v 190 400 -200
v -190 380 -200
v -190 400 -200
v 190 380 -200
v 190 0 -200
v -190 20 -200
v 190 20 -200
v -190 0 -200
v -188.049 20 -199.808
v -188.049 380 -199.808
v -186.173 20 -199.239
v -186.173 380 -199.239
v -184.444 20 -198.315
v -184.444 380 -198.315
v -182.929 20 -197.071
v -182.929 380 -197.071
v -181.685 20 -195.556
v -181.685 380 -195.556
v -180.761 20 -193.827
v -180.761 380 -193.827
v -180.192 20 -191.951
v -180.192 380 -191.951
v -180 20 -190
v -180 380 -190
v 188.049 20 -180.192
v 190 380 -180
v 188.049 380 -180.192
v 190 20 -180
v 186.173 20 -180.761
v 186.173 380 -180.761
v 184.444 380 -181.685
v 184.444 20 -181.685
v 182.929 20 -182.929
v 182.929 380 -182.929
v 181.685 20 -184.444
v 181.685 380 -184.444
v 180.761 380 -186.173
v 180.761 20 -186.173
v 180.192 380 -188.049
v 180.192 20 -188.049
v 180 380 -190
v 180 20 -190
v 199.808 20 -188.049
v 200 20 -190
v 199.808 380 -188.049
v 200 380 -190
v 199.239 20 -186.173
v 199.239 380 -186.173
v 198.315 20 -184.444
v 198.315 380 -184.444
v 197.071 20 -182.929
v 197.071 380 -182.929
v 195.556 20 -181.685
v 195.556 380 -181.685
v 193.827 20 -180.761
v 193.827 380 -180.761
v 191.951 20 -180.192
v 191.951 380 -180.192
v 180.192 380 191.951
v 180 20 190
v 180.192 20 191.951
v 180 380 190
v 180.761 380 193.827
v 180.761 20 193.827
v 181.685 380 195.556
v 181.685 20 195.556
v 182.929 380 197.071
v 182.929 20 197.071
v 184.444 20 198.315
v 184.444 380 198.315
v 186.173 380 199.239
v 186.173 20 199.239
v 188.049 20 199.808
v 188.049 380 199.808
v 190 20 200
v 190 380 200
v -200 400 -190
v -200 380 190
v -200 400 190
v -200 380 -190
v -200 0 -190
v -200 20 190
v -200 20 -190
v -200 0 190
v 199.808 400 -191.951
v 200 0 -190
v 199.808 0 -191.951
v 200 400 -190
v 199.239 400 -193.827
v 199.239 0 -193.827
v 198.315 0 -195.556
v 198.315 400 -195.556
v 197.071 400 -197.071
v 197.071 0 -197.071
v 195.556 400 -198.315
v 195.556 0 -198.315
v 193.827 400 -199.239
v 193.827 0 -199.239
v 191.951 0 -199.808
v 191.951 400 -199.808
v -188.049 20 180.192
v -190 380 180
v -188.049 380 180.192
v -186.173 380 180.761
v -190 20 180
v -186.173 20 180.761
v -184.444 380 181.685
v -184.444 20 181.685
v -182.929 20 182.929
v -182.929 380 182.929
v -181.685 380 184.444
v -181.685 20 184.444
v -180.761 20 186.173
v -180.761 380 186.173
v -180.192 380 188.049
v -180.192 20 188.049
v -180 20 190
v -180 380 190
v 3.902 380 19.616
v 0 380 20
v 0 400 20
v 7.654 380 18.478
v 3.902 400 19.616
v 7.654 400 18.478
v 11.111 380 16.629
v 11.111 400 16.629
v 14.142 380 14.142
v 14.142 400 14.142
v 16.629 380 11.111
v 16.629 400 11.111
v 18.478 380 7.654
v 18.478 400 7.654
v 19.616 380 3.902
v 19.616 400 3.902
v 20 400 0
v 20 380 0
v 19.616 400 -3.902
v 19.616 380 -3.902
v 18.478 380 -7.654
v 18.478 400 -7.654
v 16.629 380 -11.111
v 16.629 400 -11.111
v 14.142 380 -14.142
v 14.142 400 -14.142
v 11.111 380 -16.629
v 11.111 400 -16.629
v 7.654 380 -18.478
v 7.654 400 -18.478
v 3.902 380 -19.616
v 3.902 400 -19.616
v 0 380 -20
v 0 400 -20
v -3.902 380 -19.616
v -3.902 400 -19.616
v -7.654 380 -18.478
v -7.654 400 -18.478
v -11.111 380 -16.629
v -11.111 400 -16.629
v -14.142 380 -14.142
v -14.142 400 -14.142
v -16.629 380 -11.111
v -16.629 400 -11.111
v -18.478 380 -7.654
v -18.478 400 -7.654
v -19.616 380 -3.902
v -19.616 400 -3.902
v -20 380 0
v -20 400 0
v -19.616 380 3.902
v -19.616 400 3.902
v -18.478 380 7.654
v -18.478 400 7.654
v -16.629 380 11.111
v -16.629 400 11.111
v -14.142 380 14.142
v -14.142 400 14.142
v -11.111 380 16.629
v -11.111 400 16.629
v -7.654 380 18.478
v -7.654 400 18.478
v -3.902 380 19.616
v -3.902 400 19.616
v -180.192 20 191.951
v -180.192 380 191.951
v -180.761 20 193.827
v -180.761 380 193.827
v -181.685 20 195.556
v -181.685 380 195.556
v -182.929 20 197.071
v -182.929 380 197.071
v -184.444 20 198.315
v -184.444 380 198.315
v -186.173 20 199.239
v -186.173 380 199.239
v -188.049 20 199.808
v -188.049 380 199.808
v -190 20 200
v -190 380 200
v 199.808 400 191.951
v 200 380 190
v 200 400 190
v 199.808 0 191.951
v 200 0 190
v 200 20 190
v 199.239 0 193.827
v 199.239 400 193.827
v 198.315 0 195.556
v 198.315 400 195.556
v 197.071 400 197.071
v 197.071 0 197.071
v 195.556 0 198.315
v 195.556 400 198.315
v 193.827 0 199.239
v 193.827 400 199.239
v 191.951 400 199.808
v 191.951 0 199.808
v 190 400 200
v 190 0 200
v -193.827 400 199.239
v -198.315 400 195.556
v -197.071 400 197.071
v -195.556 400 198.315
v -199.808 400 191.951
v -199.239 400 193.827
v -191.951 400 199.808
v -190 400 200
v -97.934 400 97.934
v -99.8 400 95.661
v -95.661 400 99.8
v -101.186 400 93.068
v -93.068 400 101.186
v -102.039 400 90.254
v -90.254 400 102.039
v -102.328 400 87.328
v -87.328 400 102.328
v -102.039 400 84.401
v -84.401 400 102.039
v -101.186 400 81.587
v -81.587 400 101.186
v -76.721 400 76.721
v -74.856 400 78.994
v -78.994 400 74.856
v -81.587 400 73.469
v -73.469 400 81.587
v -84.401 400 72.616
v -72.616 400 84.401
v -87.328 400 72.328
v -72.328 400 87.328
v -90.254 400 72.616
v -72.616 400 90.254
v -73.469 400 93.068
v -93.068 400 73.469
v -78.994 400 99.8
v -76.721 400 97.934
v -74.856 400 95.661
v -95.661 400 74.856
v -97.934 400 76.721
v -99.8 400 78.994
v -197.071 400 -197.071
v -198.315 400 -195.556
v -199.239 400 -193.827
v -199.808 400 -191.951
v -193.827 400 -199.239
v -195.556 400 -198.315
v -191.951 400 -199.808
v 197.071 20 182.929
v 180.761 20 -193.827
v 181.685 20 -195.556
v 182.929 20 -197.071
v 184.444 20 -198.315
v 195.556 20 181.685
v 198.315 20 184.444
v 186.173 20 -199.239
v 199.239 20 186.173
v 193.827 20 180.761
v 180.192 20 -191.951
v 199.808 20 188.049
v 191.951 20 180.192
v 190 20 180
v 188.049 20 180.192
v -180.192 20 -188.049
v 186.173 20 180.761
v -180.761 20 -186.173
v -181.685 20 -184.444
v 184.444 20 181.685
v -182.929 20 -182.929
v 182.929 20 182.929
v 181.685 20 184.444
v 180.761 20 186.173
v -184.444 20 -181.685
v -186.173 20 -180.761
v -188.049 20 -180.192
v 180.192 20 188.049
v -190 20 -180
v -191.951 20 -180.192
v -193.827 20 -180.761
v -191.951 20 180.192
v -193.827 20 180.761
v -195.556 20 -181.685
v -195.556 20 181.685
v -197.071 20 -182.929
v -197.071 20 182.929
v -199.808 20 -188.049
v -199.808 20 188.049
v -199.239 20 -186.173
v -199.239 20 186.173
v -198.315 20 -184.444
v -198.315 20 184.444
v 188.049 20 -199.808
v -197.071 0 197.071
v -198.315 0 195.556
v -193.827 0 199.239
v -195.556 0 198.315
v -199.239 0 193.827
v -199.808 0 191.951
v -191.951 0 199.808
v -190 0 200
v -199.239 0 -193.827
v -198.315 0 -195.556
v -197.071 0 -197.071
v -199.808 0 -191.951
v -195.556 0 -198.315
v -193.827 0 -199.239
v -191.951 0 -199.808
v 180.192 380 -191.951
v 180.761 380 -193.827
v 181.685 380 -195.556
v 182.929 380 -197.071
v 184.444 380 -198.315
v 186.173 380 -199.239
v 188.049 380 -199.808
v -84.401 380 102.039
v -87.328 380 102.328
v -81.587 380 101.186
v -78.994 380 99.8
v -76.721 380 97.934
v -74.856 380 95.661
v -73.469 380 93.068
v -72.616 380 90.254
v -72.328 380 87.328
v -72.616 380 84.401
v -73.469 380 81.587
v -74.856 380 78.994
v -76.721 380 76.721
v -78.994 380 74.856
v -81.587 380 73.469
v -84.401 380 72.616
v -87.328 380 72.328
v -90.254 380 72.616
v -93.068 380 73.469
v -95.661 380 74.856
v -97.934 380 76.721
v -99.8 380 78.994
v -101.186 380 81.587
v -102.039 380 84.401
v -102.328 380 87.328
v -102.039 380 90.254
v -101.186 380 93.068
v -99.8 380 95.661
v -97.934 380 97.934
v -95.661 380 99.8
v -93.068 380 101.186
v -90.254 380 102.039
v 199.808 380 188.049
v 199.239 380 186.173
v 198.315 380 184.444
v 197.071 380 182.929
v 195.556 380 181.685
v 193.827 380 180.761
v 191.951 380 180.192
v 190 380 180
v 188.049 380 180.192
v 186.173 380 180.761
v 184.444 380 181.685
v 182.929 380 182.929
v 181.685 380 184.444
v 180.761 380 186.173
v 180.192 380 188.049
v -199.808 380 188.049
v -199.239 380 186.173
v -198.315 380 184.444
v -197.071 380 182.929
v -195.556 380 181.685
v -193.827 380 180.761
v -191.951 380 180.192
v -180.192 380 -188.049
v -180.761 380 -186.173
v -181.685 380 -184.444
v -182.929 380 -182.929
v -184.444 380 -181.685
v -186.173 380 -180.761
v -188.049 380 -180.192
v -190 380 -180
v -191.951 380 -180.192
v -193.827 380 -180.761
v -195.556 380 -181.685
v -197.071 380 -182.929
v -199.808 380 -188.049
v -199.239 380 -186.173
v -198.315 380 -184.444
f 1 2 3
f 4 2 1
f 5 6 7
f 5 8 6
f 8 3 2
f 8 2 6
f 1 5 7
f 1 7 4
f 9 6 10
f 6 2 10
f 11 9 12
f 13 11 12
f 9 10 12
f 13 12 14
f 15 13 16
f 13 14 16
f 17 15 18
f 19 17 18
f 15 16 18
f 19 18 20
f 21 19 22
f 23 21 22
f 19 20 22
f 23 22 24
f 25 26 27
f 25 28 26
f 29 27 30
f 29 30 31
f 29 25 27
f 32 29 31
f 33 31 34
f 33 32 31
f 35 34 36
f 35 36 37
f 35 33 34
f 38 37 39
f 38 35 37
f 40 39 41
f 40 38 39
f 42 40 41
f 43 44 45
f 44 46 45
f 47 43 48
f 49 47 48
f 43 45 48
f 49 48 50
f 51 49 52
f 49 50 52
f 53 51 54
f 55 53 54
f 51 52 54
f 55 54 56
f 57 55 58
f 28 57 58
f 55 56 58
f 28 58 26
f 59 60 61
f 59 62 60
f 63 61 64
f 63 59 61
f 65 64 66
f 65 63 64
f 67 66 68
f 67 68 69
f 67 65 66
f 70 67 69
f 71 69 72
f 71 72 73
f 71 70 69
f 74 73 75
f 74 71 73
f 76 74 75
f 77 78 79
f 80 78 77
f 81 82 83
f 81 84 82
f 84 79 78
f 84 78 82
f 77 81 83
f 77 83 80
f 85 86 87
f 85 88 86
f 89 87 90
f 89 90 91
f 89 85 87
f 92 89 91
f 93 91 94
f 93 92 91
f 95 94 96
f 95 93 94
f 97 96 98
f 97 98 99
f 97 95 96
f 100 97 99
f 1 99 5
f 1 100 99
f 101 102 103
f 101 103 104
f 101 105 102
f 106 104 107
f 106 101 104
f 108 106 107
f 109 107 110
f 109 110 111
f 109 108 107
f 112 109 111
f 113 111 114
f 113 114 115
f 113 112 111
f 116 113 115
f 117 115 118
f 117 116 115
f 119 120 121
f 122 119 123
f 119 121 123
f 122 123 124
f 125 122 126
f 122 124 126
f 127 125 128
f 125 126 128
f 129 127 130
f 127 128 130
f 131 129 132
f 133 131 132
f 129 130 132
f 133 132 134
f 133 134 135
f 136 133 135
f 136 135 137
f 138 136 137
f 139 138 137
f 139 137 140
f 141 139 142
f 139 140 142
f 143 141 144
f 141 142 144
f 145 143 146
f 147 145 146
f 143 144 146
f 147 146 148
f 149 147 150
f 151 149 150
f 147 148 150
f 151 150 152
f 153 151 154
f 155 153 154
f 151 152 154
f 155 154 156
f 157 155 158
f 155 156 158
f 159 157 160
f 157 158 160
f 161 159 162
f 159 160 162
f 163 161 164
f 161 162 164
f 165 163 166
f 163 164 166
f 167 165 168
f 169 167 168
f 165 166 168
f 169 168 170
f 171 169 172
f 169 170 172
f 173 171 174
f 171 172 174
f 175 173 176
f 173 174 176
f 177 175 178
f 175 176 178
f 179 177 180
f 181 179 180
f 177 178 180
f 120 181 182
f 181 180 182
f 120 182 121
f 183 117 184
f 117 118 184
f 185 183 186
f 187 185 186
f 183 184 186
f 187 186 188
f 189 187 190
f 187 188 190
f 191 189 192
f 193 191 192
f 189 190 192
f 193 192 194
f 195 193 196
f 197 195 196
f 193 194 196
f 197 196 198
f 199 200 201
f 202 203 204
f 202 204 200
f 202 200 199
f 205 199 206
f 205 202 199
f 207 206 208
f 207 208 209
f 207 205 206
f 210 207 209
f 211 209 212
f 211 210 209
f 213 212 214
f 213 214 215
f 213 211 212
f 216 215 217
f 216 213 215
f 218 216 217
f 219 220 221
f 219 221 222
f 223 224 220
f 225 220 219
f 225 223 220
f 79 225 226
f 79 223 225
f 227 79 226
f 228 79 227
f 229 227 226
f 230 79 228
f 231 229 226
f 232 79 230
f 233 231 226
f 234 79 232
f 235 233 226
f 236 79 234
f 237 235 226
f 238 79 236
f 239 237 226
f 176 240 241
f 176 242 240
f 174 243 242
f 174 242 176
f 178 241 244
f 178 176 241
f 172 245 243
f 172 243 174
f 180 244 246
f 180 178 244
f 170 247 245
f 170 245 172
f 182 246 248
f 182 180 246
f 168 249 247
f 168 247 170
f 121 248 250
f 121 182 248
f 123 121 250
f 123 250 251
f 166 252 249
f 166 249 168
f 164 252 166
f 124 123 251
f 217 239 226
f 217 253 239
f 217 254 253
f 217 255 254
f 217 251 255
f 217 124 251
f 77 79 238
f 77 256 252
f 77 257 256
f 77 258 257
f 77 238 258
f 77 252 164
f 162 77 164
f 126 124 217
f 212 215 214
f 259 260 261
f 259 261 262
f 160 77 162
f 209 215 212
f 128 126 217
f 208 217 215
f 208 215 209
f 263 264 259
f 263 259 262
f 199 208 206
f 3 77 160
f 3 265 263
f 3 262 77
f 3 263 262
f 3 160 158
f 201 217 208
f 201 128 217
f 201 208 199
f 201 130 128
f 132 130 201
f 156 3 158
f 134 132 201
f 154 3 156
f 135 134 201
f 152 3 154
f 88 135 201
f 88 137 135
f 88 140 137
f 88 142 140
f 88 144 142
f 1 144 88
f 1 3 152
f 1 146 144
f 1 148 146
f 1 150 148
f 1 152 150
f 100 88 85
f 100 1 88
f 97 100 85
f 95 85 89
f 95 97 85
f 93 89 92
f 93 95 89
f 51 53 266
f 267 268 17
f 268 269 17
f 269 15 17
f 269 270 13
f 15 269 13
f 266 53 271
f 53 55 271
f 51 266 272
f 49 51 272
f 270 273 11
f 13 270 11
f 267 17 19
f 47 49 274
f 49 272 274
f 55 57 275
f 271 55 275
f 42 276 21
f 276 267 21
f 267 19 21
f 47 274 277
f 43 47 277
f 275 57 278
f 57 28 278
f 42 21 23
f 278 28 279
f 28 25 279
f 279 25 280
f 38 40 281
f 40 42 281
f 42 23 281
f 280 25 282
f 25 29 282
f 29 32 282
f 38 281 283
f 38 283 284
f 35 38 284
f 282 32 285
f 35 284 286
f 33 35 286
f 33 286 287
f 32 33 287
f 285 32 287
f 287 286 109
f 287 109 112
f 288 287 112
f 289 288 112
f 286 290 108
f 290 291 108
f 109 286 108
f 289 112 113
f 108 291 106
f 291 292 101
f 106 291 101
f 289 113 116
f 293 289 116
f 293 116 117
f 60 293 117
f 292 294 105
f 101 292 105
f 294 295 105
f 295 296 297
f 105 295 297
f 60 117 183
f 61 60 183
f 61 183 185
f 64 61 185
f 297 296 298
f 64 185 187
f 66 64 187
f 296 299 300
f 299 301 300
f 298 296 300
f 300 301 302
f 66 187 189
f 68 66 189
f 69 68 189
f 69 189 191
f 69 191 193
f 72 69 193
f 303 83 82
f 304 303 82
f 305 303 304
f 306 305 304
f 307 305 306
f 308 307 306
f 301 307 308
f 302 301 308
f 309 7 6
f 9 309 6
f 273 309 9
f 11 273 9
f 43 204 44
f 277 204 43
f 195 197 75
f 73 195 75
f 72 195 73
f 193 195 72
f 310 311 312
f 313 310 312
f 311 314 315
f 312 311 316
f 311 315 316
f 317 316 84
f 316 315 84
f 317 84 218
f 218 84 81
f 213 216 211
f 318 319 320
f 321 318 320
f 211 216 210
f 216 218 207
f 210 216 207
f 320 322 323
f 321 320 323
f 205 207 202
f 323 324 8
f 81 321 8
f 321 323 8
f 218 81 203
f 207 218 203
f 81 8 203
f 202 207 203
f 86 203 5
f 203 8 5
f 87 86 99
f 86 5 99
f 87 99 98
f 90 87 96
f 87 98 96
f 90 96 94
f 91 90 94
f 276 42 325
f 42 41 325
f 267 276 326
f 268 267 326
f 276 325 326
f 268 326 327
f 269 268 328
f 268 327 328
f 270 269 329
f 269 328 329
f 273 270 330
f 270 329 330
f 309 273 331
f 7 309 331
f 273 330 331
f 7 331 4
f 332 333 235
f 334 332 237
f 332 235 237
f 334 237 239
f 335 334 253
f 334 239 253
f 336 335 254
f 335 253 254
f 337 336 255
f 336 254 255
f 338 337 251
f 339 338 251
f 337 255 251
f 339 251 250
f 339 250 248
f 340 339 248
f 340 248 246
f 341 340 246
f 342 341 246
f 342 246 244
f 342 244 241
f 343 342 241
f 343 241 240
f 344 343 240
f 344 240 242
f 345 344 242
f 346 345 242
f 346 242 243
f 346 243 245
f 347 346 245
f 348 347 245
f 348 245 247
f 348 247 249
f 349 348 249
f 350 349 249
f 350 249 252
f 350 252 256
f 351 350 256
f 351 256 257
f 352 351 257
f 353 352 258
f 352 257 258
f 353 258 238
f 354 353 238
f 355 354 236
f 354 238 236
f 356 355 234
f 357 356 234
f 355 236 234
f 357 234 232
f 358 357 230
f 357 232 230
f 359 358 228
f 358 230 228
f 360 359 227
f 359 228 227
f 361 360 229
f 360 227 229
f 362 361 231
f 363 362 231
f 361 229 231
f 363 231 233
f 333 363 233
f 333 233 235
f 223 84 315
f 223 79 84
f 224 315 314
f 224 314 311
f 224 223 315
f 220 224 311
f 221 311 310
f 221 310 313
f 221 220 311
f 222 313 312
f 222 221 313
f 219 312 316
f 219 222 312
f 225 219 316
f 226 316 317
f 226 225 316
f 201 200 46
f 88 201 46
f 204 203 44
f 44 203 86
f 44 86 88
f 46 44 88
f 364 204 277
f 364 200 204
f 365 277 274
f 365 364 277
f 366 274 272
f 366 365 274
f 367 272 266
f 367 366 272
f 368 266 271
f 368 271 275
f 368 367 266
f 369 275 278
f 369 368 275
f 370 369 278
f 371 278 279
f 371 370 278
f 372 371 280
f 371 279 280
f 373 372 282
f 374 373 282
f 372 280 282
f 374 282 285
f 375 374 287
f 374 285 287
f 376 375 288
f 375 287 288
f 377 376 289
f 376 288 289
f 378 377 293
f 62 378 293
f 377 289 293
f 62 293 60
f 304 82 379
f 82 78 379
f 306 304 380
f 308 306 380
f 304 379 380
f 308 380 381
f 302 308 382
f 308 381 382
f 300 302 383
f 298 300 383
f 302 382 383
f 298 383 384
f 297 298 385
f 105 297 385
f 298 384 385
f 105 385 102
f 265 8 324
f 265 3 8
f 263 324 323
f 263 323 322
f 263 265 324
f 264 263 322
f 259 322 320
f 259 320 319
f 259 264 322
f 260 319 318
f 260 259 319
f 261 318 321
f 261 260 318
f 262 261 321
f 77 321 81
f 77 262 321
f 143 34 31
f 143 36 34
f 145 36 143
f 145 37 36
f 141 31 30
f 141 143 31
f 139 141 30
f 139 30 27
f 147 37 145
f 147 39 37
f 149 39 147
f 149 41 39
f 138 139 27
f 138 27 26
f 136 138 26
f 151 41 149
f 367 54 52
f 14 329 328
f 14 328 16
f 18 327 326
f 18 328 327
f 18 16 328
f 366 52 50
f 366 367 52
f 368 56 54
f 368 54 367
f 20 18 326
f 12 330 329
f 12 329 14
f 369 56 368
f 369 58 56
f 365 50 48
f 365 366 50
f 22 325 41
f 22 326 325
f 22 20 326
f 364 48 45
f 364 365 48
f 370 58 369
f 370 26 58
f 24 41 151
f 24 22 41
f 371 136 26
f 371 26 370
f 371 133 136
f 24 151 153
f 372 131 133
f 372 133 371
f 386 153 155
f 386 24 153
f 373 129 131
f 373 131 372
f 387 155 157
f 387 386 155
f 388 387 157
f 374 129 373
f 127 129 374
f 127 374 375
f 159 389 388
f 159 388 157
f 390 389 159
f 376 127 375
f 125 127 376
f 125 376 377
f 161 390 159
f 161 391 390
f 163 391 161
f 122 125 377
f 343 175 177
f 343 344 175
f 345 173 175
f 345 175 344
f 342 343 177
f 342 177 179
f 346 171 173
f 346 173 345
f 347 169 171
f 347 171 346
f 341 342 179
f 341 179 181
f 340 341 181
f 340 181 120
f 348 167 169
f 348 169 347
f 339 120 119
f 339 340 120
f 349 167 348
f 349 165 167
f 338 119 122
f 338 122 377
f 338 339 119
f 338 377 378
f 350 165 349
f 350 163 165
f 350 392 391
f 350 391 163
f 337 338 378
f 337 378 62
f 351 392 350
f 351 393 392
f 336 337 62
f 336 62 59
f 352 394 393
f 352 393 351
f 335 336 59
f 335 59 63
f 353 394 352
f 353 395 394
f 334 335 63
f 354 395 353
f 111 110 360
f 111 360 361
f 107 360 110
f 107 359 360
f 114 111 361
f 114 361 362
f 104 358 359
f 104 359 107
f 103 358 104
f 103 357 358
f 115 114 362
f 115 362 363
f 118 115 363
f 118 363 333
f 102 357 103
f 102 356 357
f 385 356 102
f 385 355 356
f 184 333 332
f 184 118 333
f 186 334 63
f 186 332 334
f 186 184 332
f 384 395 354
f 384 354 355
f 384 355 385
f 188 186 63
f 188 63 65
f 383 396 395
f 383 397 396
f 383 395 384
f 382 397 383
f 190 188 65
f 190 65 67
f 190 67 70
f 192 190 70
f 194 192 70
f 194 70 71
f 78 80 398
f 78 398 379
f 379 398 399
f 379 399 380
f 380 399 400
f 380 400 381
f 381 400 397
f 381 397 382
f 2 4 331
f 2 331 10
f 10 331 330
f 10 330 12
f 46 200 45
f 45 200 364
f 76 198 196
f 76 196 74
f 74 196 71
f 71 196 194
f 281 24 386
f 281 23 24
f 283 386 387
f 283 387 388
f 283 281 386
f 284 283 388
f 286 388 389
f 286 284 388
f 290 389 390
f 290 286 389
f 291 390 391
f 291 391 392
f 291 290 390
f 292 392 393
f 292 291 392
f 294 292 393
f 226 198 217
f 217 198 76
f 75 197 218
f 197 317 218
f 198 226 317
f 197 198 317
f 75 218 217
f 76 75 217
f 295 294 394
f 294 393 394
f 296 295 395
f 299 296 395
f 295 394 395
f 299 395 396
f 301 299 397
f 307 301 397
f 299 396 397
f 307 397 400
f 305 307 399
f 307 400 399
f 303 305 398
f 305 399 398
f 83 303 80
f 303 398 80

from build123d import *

# Parameters (mm, degrees)
SKETCH2_W           = 400
SKETCH2_H           = 400
BOSS_EXTRUDE1_DEPTH = 400
SKETCH3_W           = 360
SKETCH3_H           = 360
CUT_EXTRUDE4_DEPTH  = 400
SKETCH5_W           = 360
SKETCH5_H           = 360
CUT_EXTRUDE5_DEPTH  = 400
FILLET1_R           = 10
FILLET2_START       = -1
FILLET2_DEPTH       = 402
FILLET3_R           = 10
FILLET4_R           = 10
FILLET6_R           = 10
FILLET7_R           = 10
FILLET8_R           = 10
SKETCH6_R           = 20
CUT_EXTRUDE6_DEPTH  = 20
SKETCH9_R           = 15
CUT_EXTRUDE8_DEPTH  = 71


with BuildPart() as part:
    # Sketch2 → Boss-Extrude1 (new body)
    with BuildSketch(Plane(origin=(0, 0, 0), x_dir=(1, 0, 0), z_dir=(0, 1, 0))):
        Rectangle(SKETCH2_W, SKETCH2_H)
    extrude(amount=BOSS_EXTRUDE1_DEPTH)

    # Sketch3 → Cut-Extrude4 (cut)
    with BuildSketch(Plane.XY.offset(200)):
        with Locations((0, 200)):
            Rectangle(SKETCH3_W, SKETCH3_H)
    extrude(amount=-CUT_EXTRUDE4_DEPTH, mode=Mode.SUBTRACT)

    # Sketch5 → Cut-Extrude5 (cut)
    with BuildSketch(Plane.ZY.offset(200)):
        with Locations((0, 200)):
            Rectangle(SKETCH5_W, SKETCH5_H)
    extrude(amount=-CUT_EXTRUDE5_DEPTH, mode=Mode.SUBTRACT)

    # Fillet1
    fillet1_edges = [part.edges().sort_by_distance(p)[0] for p in [
        (200, 200, 180),
    ]]
    fillet(fillet1_edges, radius=FILLET1_R)

    # Fillet2: read off the stored shape, not the designer's step
    # Fillet2 outline → Fillet2 (cut)
    with BuildSketch(Plane(origin=(0, 0, 0), x_dir=(1, 0, 0), z_dir=(0, 1, 0)).offset(FILLET2_START)):
        with BuildLine():
            Line((200, -200), (200, -190))
            ThreePointArc((200, -190), (197.071067812, -197.071067812), (190, -200))
            Line((190, -200), (200, -200))
        make_face()
    extrude(amount=FILLET2_DEPTH, mode=Mode.SUBTRACT)

    # Fillet3
    fillet3_edges = [part.edges().sort_by_distance(p)[0] for p in [
        (180, 200, 180),
    ]]
    fillet(fillet3_edges, radius=FILLET3_R - 0.0001)  # a hair under: the kernel refuses the full size

    # Fillet4
    fillet4_edges = [part.edges().sort_by_distance(p)[0] for p in [
        (180, 200, 200),
    ]]
    fillet(fillet4_edges, radius=FILLET4_R - 0.0001)  # a hair under: the kernel refuses the full size

    # Fillet6
    fillet6_edges = [part.edges().sort_by_distance(p)[0] for p in [
        (-180, 200, -180),
        (-180, 200, -200),
        (-200, 200, -200),
        (-200, 200, -180),
    ]]
    fillet(fillet6_edges, radius=FILLET6_R - 0.0001)  # a hair under: the kernel refuses the full size

    # Fillet7
    fillet7_edges = [part.edges().sort_by_distance(p)[0] for p in [
        (200, 200, -180),
        (180, 200, -180),
        (180, 200, -200),
        (200, 200, -200),
    ]]
    fillet(fillet7_edges, radius=FILLET7_R - 0.0001)  # a hair under: the kernel refuses the full size

    # Fillet8
    fillet8_edges = [part.edges().sort_by_distance(p)[0] for p in [
        (-180, 200, 180),
        (-200, 200, 180),
        (-180, 200, 200),
        (-200, 200, 200),
    ]]
    fillet(fillet8_edges, radius=FILLET8_R - 0.0001)  # a hair under: the kernel refuses the full size

    # Sketch6 → Cut-Extrude6 (cut)
    with BuildSketch(Plane(origin=(0, 400, 0), x_dir=(1, 0, 0), z_dir=(0, 1, 0))):
        with Locations(Location((0, 0, 0), (0, 0, 270))):
            Circle(SKETCH6_R)
    extrude(amount=-CUT_EXTRUDE6_DEPTH, mode=Mode.SUBTRACT)

    # Sketch9 → Cut-Extrude8 (cut)
    with BuildSketch(Plane(origin=(0, 400, 0), x_dir=(1, 0, 0), z_dir=(0, 1, 0))):
        with Locations(Location((-87.327687477, -87.327687477, 0), (0, 0, 270))):
            Circle(SKETCH9_R)
    extrude(amount=-CUT_EXTRUDE8_DEPTH, mode=Mode.SUBTRACT)


solid = part.part
